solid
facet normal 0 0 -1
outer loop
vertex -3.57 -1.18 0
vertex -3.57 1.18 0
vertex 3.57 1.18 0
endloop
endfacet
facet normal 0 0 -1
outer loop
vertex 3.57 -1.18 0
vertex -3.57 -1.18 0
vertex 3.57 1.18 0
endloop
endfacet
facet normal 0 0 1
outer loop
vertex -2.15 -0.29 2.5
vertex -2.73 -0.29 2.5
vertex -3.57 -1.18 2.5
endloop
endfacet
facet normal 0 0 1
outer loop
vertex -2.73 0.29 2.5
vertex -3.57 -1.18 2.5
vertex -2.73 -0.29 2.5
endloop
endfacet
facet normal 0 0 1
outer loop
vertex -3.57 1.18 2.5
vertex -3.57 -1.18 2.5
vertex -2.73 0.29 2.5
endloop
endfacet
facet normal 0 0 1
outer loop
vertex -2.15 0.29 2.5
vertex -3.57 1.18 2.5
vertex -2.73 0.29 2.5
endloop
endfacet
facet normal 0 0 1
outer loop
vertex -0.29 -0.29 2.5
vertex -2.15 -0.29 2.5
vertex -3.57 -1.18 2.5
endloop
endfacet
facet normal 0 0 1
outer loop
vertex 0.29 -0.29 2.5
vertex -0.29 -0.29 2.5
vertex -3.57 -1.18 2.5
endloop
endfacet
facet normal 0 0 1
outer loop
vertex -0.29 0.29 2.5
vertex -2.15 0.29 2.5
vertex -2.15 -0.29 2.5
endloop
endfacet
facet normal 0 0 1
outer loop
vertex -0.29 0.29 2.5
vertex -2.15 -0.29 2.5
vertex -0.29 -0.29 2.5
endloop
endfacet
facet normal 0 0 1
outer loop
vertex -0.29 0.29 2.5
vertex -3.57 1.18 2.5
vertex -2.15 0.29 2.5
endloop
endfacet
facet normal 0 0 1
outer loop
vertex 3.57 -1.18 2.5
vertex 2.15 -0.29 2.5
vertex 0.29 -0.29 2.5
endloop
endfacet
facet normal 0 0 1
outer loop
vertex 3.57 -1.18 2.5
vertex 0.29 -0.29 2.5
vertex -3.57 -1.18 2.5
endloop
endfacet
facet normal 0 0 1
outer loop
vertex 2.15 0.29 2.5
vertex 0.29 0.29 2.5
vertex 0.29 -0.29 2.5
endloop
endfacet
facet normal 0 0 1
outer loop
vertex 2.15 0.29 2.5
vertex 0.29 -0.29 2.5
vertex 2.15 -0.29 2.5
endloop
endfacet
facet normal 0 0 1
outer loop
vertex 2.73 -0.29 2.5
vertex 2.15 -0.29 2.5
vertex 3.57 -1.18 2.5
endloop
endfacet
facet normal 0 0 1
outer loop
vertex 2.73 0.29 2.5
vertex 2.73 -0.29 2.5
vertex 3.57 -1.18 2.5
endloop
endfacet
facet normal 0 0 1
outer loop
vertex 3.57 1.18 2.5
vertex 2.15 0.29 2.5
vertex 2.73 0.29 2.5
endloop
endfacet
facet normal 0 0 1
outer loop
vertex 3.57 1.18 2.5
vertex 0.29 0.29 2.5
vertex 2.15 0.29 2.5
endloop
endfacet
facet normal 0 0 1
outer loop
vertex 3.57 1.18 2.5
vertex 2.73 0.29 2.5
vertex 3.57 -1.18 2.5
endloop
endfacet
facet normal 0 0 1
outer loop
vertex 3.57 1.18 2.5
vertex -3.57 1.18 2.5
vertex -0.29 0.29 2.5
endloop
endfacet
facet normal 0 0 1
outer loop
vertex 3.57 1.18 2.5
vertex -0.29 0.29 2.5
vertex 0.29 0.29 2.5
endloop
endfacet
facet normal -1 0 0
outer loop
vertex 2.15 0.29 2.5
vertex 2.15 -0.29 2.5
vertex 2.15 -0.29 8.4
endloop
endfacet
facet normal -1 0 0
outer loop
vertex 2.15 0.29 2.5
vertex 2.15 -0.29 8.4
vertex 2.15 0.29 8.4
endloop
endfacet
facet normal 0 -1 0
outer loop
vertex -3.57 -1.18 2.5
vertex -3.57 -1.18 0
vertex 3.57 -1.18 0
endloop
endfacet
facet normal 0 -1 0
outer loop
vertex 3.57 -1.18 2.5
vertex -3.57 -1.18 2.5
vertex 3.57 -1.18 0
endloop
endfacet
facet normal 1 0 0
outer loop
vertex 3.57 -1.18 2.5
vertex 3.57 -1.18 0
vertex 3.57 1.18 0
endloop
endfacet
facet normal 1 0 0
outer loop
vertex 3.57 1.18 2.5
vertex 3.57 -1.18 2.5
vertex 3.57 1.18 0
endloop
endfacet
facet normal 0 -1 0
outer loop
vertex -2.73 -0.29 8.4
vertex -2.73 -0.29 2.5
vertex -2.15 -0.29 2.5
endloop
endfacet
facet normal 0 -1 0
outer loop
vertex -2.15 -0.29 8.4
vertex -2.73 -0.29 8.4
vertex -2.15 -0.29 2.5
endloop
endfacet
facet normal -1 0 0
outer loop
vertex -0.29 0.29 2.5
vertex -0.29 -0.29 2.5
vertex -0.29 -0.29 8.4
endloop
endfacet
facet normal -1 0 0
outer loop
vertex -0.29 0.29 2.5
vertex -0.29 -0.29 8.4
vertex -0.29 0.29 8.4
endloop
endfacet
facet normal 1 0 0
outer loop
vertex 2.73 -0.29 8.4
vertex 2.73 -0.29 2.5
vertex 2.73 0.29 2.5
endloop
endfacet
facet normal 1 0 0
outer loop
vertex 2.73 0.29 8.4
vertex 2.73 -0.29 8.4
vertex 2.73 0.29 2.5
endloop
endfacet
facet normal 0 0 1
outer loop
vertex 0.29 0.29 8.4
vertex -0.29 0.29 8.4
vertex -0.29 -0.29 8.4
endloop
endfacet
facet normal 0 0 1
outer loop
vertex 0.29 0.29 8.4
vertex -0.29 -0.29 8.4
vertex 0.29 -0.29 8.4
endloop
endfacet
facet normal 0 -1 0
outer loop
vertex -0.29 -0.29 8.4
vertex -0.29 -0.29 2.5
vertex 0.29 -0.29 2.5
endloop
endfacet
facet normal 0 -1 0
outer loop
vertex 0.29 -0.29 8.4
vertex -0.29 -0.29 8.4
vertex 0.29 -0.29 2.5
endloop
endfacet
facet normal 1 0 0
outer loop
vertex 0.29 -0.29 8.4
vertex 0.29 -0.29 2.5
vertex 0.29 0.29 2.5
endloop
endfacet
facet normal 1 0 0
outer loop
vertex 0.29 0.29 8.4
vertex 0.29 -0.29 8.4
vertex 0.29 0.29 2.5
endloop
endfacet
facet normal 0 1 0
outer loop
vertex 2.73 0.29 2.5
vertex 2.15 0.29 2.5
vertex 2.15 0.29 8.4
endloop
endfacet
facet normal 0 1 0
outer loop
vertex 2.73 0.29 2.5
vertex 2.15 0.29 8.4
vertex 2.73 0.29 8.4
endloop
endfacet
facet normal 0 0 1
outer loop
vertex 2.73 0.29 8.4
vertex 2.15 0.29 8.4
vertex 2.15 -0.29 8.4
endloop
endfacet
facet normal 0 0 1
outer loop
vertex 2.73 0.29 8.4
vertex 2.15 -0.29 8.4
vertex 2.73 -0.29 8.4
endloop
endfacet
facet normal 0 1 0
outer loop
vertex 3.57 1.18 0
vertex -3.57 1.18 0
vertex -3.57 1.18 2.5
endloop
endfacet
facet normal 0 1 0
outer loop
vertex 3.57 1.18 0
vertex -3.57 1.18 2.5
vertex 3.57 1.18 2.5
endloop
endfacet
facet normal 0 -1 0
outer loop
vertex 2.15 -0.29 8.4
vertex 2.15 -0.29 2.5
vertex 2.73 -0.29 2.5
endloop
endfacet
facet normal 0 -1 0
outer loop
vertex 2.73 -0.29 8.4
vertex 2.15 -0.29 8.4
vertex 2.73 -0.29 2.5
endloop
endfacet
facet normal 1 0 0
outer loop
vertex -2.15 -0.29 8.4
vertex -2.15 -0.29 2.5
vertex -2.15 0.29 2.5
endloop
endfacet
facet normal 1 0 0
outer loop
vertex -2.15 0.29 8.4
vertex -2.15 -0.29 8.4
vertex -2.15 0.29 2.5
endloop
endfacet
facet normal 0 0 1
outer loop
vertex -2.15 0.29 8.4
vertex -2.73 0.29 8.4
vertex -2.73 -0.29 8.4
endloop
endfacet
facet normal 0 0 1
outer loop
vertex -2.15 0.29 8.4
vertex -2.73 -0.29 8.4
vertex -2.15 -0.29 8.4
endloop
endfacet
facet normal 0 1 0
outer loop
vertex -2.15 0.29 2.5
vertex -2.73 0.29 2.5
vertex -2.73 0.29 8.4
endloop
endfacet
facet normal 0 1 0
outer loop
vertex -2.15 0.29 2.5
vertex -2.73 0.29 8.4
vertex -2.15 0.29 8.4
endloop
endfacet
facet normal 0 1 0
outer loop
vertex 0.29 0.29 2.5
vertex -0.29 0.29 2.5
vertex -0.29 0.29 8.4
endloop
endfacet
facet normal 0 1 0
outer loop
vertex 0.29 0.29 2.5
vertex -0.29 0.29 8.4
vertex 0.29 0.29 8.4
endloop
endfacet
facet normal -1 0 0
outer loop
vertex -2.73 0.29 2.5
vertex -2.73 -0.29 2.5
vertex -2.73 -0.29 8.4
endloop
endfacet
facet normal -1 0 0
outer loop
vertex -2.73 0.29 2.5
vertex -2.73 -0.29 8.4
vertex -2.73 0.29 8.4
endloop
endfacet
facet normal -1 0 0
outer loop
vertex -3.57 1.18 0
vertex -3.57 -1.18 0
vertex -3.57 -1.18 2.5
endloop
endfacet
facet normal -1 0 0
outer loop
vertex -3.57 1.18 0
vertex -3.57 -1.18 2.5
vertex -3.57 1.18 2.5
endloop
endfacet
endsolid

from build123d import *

# Parameters (mm, degrees)
SKICA1_W                = 7.14
SKICA1_H                = 2.36
P_IDAT_VYSUNUT_M1_DEPTH = 2.5
SKICA2_W                = 0.58
SKICA2_H                = 0.58
P_IDAT_VYSUNUT_M2_DEPTH = 5.9
LINPOLE1_COUNT          = 3
LINPOLE1_PITCH          = 2.44


with BuildPart() as part:
    # Skica1 → Přidat vysunutím1 (new body)
    with BuildSketch(Plane.XY):
        Rectangle(SKICA1_W, SKICA1_H)
    extrude(amount=P_IDAT_VYSUNUT_M1_DEPTH)

    # Skica2 → Přidat vysunutím2 (add)
    with BuildSketch(Plane.XY.offset(2.5)):
        with Locations((2.44, 0)):
            Rectangle(SKICA2_W, SKICA2_H)
    p_idat_vysunut_m2 = extrude(amount=P_IDAT_VYSUNUT_M2_DEPTH)

    # LinPole1: Přidat vysunutím2 ×3
    with Locations(*[(-i * LINPOLE1_PITCH, 0, 0) for i in range(1, LINPOLE1_COUNT)]):
        add(p_idat_vysunut_m2)


solid = part.part
